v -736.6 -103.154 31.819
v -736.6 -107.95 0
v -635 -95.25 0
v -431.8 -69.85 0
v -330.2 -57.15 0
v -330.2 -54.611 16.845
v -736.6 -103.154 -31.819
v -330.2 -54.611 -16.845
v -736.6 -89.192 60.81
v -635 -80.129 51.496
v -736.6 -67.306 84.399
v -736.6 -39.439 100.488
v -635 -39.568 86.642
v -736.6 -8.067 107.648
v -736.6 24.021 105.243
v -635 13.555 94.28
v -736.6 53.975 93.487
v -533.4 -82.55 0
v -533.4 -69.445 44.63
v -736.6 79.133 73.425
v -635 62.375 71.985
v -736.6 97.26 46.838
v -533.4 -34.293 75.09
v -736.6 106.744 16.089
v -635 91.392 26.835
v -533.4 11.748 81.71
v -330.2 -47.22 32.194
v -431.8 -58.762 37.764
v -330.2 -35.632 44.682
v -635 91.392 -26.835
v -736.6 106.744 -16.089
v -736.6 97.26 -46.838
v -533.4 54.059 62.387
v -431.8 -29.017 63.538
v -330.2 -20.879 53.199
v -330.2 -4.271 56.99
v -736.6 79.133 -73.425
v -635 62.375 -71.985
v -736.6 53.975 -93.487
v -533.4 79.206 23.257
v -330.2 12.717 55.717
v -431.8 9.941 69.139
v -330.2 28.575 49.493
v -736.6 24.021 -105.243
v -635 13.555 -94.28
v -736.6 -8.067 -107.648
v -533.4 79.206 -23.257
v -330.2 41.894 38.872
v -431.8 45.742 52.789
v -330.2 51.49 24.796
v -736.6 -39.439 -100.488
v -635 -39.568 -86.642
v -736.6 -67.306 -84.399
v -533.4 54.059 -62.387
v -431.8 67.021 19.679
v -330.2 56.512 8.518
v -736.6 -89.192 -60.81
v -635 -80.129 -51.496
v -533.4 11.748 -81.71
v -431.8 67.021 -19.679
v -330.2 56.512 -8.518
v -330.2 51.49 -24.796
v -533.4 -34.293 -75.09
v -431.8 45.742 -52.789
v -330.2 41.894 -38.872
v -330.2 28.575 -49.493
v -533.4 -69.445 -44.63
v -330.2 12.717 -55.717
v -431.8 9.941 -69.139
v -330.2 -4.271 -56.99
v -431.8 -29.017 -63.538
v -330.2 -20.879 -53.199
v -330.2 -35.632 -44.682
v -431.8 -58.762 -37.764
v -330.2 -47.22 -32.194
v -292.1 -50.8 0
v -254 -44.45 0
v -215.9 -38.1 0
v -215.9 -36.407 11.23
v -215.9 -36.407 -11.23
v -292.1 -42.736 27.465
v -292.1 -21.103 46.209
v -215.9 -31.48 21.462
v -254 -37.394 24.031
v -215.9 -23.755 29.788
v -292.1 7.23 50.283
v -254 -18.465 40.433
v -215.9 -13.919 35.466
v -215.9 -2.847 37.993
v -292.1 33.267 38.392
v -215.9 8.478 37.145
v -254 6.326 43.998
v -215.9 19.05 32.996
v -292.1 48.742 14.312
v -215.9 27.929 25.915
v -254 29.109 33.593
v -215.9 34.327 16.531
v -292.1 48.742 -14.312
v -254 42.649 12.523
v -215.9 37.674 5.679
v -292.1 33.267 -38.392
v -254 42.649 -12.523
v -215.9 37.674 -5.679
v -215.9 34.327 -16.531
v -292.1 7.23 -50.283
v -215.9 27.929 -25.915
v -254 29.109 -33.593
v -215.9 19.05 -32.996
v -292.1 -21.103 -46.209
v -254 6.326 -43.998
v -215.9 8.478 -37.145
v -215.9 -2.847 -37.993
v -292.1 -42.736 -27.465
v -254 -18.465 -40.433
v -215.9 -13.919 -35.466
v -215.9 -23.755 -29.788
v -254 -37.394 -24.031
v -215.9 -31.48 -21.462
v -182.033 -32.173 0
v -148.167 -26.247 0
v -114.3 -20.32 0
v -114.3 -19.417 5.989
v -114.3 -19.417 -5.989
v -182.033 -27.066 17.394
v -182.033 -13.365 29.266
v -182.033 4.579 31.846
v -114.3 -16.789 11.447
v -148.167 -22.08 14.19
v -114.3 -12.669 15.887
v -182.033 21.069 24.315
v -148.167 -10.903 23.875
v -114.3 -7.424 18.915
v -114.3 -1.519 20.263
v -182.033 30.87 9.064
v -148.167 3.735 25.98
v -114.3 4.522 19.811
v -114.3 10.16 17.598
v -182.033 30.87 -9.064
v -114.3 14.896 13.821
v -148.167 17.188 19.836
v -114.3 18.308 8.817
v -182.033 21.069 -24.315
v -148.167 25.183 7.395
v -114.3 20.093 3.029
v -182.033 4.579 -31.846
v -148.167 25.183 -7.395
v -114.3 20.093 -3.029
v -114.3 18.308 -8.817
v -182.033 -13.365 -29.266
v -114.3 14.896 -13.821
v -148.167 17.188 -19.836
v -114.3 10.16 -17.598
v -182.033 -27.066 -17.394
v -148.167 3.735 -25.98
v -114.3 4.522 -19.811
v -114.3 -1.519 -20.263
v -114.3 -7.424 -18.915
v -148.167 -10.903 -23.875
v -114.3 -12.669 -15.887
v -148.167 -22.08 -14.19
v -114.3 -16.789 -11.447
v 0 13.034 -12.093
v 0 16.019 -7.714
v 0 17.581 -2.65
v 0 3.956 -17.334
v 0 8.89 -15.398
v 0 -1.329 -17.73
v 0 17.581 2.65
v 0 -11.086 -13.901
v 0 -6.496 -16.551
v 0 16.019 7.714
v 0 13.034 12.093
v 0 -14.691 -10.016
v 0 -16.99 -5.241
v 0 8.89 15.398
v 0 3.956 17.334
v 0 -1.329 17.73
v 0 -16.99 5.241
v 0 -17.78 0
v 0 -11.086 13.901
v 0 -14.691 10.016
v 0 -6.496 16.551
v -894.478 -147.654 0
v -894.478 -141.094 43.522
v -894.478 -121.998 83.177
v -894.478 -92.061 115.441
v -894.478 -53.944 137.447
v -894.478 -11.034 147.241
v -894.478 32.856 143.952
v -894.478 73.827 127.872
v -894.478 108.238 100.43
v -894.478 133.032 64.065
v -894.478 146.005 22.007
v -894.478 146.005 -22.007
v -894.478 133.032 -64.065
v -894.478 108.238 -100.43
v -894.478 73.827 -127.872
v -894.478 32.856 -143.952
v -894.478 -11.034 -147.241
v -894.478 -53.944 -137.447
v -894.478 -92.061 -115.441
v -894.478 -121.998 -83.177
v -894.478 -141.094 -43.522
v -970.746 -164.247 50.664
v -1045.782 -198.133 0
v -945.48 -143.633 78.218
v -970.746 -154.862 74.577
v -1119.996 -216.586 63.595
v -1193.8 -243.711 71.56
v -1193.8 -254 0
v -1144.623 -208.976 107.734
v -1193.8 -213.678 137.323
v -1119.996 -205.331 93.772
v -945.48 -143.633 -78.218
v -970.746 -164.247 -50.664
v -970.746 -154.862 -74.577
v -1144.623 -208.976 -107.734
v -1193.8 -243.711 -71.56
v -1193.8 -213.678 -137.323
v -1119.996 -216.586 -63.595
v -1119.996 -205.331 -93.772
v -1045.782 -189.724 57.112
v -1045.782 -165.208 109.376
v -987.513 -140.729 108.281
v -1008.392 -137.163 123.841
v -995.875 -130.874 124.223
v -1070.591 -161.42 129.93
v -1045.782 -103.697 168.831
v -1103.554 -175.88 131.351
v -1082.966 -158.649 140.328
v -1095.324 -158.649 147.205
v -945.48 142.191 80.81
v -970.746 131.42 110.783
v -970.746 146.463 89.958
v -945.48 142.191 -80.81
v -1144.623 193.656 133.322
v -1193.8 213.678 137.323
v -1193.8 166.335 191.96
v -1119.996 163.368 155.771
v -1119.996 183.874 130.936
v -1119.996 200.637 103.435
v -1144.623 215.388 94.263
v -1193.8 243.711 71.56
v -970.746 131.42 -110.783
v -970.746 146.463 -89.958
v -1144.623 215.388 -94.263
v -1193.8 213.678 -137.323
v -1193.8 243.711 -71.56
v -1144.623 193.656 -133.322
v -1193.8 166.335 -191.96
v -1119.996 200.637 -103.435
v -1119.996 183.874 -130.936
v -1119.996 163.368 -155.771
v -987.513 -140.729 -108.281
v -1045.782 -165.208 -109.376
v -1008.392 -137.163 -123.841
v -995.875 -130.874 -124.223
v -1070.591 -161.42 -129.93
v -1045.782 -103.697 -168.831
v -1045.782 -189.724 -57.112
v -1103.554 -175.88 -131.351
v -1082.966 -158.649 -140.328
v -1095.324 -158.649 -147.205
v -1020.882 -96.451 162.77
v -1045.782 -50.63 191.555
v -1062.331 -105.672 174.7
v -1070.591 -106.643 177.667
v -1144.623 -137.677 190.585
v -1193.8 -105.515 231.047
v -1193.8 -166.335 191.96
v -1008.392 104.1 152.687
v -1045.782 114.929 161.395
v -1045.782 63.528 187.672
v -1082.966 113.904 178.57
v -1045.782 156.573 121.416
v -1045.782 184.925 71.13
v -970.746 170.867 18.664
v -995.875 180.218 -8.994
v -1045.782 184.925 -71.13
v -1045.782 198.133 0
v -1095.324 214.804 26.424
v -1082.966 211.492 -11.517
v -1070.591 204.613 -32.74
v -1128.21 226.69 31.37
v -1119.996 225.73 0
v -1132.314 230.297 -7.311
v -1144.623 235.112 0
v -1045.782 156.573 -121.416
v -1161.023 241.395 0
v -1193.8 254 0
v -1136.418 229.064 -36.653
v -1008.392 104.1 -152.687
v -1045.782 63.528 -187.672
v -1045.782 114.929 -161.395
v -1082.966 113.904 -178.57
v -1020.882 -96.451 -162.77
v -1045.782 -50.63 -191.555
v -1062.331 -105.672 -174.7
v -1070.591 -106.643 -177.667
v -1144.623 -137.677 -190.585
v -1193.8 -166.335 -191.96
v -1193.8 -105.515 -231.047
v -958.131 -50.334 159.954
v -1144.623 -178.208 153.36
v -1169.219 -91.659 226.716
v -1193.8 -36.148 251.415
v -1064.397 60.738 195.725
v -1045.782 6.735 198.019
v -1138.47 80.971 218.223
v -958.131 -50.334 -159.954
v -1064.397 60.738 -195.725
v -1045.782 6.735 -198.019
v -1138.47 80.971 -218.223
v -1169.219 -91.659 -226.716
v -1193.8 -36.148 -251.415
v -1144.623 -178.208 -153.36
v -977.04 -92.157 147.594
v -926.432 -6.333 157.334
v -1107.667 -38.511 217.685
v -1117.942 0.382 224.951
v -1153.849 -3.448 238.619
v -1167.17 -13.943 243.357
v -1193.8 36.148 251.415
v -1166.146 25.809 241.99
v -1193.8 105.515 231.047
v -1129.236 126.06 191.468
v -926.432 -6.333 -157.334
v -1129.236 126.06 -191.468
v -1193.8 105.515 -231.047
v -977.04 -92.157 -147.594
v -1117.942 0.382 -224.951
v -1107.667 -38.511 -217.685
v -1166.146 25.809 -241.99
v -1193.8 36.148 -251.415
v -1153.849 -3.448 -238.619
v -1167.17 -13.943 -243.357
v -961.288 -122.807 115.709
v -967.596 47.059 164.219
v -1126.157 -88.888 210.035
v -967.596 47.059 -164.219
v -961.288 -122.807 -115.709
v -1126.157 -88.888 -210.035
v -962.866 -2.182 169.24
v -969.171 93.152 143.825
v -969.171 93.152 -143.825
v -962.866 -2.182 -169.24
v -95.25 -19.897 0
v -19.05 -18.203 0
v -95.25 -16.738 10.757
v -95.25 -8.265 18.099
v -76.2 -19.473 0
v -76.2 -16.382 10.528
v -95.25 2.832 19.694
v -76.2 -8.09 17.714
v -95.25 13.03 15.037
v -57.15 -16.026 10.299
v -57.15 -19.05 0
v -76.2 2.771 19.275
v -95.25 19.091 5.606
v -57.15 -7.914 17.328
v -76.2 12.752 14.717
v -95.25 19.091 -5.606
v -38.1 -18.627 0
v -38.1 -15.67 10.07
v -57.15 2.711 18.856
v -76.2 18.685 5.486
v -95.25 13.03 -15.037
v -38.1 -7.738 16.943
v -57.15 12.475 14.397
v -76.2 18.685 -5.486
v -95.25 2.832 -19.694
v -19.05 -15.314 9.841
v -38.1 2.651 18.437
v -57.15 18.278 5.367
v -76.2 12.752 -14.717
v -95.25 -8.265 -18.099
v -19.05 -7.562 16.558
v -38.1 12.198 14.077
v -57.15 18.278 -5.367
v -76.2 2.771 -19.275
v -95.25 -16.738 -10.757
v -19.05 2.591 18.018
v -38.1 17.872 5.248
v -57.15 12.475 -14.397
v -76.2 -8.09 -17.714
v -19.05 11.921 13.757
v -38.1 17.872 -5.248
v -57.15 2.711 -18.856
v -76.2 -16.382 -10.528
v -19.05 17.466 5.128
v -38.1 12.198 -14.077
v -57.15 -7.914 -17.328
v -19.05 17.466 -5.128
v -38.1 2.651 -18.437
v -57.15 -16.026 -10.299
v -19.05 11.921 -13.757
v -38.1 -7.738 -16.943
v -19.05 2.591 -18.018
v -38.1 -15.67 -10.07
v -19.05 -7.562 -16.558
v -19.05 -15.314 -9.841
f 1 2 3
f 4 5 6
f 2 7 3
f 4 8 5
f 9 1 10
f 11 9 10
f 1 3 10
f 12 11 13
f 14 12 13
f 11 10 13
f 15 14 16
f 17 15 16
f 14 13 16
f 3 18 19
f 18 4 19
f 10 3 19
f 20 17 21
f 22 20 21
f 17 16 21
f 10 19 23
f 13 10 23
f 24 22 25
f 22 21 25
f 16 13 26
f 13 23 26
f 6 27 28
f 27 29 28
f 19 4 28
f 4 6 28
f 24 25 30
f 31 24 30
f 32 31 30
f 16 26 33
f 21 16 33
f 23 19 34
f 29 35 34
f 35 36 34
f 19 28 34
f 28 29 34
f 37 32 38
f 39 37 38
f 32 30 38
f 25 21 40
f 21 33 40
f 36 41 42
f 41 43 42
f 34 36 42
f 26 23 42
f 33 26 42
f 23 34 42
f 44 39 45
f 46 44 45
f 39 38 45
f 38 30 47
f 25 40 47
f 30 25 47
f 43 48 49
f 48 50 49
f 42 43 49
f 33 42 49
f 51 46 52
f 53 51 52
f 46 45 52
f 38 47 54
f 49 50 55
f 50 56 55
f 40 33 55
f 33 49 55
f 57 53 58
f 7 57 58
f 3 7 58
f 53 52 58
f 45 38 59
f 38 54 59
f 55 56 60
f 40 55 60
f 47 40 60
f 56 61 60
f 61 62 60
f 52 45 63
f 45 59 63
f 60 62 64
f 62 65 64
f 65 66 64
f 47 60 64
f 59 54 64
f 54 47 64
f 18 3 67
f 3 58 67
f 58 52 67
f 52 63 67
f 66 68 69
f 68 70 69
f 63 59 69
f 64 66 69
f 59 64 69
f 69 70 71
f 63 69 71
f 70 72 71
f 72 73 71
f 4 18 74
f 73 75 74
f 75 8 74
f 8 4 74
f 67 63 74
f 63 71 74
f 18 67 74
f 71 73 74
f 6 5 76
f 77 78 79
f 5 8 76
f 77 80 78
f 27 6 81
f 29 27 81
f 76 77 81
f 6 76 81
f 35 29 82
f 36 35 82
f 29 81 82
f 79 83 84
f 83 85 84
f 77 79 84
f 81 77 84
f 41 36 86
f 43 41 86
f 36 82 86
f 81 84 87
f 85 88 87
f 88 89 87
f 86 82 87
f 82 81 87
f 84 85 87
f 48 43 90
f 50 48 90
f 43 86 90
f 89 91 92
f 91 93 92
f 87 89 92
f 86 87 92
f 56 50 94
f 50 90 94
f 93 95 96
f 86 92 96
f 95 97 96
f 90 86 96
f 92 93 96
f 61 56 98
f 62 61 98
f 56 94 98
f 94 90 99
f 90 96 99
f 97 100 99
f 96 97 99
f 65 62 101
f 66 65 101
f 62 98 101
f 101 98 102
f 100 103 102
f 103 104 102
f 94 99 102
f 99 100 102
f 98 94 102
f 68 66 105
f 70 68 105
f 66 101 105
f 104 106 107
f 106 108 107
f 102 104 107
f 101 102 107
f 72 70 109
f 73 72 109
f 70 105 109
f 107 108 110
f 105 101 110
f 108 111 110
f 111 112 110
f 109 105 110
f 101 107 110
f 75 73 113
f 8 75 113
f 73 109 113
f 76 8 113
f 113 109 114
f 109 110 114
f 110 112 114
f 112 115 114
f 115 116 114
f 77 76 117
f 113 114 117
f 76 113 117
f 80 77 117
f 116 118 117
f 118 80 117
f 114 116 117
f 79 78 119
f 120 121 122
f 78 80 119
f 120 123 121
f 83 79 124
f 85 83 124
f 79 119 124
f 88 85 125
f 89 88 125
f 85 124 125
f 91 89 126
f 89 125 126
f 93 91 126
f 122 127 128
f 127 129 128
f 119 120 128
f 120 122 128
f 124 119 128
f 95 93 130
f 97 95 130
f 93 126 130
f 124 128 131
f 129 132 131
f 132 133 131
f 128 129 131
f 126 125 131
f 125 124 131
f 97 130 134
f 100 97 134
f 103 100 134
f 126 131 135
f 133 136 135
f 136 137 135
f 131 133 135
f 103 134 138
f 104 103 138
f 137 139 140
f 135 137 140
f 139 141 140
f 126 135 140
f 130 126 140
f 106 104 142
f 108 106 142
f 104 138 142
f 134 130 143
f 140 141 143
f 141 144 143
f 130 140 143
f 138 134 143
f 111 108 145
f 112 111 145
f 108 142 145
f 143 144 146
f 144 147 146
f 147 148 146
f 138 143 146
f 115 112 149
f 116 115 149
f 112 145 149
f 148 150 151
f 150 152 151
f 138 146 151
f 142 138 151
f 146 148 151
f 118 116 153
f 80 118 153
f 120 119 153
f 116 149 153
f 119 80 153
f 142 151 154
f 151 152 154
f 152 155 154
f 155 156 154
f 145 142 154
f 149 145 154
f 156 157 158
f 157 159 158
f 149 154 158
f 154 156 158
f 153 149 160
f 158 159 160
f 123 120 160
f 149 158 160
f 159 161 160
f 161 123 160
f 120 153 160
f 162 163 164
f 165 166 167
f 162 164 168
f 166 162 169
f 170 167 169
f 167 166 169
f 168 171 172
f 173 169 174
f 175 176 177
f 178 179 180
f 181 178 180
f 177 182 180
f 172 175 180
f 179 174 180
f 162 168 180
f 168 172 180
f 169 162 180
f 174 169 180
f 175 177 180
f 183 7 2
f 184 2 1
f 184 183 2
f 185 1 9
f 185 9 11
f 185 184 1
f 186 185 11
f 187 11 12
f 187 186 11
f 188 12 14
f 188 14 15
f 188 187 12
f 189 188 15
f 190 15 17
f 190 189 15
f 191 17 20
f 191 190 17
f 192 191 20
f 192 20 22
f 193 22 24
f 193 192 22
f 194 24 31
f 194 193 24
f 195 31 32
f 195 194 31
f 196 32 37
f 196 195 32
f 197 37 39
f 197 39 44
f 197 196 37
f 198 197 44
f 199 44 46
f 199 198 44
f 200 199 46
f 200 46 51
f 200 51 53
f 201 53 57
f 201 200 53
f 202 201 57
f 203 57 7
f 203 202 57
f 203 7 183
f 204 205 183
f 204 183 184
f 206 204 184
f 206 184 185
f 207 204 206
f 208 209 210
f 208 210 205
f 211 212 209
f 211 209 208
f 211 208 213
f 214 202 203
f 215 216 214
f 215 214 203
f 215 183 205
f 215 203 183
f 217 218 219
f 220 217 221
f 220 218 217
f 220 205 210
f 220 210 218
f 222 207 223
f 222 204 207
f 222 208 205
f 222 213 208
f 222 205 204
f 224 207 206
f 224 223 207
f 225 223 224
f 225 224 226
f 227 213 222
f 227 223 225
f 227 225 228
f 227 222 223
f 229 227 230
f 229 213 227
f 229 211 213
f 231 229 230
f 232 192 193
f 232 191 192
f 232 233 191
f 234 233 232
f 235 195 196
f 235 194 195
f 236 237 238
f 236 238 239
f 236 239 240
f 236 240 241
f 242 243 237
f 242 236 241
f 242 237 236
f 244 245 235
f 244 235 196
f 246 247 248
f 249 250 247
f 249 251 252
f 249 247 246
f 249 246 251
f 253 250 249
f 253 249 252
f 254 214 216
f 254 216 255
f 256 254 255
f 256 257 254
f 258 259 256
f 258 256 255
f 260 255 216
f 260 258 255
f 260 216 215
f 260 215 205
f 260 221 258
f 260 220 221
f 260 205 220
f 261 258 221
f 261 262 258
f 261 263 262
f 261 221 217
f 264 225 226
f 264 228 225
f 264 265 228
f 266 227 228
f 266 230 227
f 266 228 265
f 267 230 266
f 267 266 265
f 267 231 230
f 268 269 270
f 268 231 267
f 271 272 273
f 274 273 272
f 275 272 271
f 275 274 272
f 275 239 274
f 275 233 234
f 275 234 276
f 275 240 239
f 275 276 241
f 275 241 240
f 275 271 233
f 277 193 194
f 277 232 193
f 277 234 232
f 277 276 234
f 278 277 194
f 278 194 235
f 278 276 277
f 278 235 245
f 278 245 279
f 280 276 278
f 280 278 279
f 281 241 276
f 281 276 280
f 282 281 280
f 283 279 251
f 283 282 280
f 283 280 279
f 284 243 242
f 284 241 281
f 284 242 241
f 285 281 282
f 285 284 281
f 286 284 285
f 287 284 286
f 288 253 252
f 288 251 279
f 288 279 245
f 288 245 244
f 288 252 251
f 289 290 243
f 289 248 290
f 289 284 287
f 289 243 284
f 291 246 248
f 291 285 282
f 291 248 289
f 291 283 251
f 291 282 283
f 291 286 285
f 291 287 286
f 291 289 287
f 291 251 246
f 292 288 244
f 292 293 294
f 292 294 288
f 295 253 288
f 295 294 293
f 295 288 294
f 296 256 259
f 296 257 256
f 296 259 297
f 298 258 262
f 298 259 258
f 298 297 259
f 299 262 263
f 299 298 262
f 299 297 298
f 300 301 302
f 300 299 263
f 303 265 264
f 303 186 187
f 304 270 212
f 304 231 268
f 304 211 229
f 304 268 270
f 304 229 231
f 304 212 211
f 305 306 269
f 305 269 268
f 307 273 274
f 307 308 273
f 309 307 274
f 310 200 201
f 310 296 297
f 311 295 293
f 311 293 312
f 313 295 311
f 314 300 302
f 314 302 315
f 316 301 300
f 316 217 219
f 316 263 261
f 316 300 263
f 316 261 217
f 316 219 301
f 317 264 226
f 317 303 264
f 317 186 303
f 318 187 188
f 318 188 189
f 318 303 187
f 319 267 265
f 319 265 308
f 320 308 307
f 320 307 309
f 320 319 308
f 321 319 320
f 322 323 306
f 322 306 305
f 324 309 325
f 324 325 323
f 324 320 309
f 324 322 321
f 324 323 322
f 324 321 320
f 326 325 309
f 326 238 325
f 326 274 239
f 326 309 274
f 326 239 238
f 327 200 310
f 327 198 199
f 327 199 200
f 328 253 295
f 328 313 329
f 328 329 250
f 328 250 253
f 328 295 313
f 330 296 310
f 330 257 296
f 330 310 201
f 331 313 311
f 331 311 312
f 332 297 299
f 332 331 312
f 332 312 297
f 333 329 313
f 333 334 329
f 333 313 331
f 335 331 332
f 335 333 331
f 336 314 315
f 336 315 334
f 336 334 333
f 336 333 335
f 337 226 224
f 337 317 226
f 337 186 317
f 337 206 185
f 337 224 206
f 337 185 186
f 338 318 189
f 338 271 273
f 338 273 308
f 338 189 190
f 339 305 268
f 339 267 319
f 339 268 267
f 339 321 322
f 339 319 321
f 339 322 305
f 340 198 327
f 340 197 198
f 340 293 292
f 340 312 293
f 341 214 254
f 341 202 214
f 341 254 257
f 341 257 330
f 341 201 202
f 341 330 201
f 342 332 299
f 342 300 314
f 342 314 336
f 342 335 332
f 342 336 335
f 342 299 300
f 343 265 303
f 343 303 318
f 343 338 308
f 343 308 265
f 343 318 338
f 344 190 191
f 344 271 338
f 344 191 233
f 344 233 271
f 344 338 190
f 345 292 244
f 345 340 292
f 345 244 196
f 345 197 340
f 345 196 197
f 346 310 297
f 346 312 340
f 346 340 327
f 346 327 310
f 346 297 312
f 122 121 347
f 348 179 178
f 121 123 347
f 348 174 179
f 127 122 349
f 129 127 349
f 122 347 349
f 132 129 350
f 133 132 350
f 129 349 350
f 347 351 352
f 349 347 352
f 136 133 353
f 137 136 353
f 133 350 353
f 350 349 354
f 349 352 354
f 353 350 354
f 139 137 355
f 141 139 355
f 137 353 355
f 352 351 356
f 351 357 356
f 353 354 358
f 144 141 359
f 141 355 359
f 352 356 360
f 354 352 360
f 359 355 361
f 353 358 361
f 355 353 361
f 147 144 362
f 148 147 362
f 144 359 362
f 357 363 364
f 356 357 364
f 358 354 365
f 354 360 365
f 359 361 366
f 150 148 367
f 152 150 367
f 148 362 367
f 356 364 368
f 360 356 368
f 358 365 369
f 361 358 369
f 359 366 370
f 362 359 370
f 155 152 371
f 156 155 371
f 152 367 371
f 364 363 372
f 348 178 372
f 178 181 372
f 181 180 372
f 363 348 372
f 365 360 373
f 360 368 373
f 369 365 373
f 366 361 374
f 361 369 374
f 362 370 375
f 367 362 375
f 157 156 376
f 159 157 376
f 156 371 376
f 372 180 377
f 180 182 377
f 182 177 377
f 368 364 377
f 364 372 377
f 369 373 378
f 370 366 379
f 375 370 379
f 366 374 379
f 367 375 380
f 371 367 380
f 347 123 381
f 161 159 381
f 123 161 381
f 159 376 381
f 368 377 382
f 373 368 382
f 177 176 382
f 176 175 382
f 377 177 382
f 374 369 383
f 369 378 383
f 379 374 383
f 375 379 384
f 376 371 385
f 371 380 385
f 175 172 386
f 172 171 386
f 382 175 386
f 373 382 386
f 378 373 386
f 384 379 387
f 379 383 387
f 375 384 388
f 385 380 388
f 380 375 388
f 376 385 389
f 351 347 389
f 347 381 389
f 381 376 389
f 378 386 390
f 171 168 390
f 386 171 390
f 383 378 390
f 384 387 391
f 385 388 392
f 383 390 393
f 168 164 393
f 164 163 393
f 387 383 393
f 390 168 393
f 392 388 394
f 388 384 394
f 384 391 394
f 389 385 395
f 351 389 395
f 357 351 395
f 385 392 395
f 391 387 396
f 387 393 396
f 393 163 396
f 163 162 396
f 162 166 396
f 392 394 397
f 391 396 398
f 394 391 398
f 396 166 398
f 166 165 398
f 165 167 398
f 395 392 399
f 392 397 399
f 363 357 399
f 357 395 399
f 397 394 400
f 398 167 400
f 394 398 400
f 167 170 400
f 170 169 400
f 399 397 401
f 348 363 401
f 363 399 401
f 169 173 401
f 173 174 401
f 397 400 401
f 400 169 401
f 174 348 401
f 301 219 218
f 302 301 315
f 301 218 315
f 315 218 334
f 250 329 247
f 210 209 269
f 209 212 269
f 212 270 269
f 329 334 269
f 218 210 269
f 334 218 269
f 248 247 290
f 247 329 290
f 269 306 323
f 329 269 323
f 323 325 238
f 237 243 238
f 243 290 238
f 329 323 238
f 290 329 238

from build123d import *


with BuildPart() as f1:
    # F0 (on Top) → F1 (revolve)
    with BuildSketch(Plane.XY):
        with BuildLine():
            add(Edge.make_bspline(
                [(0, 0), (-38.4107541448, -6.923547728), (-76.8215082895, -13.847095456), (-114.3, -20.32)],
                knots=[0, 0, 0, 0, 0.145916612, 0.145916612, 0.145916612, 0.145916612], degree=3))
            Line((0, 0), (-114.3, 0))
            Line((-114.3, 0), (-114.3, -20.32))
        make_face()
        with BuildLine():
            Line((0, -17.78), (0, 0))
            add(Edge.make_bspline(
                [(0, 0), (-38.4107541448, -6.923547728), (-76.8215082895, -13.847095456), (-114.3, -20.32)],
                knots=[0, 0, 0, 0, 0.145916612, 0.145916612, 0.145916612, 0.145916612], degree=3))
            Line((-114.3, -20.32), (0, -17.78))
        make_face()
        with BuildLine():
            Line((-114.3, -20.32), (-114.3, 0))
            Line((-114.3, 0), (-215.9, 0))
            Line((-215.9, 0), (-215.9, -38.1))
            add(Edge.make_bspline(
                [(-114.3, -20.32), (-149.6266665218, -26.4212631464), (-184.1250490049, -32.1221448737), (-215.9, -38.1)],
                knots=[0.145916612, 0.145916612, 0.145916612, 0.145916612, 0.2834554311, 0.2834554311, 0.2834554311, 0.2834554311], degree=3))
        make_face()
        with BuildLine():
            Line((-215.9, -38.1), (-114.3, -20.32))
            add(Edge.make_bspline(
                [(-114.3, -20.32), (-149.6266665218, -26.4212631464), (-184.1250490049, -32.1221448737), (-215.9, -38.1)],
                knots=[0.145916612, 0.145916612, 0.145916612, 0.145916612, 0.2834554311, 0.2834554311, 0.2834554311, 0.2834554311], degree=3))
        make_face()
        Polygon((-215.9, -38.1), (-215.9, 0), (-330.2, 0), (-330.2, -57.15), align=None)
        with BuildLine():
            Line((-330.2, -57.15), (-330.2, 0))
            Line((-330.2, 0), (-736.6, 0))
            Line((-736.6, 0), (-736.6, -107.95))
            add(Edge.make_bspline(
                [(-330.2, -57.15), (-424.2035468422, -68.5554317066), (-586.7118007059, -77.9087616289), (-736.6, -107.95)],
                knots=[0.4292365201, 0.4292365201, 0.4292365201, 0.4292365201, 0.7033077599, 0.7033077599, 0.7033077599, 0.7033077599], degree=3))
        make_face()
        with BuildLine():
            Line((-736.6, -107.95), (-330.2, -57.15))
            add(Edge.make_bspline(
                [(-330.2, -57.15), (-424.2035468422, -68.5554317066), (-586.7118007059, -77.9087616289), (-736.6, -107.95)],
                knots=[0.4292365201, 0.4292365201, 0.4292365201, 0.4292365201, 0.7033077599, 0.7033077599, 0.7033077599, 0.7033077599], degree=3))
        make_face()
        with BuildLine():
            Line((-736.6, -107.95), (-736.6, 0))
            Line((-736.6, 0), (-1193.8, 0))
            Line((-1193.8, 0), (-1193.8, -254))
            add(Edge.make_bspline(
                [(-736.6, -107.95), (-898.8595120127, -140.4707501412), (-1046.3297560064, -197.2353750706), (-1193.8, -254)],
                knots=[0.7033077599, 0.7033077599, 0.7033077599, 0.7033077599, 1, 1, 1, 1], degree=3))
        make_face()
    revolve(axis=Axis((-965.2, 0, 0), (-1, 0, 0)))


solid = f1.part
